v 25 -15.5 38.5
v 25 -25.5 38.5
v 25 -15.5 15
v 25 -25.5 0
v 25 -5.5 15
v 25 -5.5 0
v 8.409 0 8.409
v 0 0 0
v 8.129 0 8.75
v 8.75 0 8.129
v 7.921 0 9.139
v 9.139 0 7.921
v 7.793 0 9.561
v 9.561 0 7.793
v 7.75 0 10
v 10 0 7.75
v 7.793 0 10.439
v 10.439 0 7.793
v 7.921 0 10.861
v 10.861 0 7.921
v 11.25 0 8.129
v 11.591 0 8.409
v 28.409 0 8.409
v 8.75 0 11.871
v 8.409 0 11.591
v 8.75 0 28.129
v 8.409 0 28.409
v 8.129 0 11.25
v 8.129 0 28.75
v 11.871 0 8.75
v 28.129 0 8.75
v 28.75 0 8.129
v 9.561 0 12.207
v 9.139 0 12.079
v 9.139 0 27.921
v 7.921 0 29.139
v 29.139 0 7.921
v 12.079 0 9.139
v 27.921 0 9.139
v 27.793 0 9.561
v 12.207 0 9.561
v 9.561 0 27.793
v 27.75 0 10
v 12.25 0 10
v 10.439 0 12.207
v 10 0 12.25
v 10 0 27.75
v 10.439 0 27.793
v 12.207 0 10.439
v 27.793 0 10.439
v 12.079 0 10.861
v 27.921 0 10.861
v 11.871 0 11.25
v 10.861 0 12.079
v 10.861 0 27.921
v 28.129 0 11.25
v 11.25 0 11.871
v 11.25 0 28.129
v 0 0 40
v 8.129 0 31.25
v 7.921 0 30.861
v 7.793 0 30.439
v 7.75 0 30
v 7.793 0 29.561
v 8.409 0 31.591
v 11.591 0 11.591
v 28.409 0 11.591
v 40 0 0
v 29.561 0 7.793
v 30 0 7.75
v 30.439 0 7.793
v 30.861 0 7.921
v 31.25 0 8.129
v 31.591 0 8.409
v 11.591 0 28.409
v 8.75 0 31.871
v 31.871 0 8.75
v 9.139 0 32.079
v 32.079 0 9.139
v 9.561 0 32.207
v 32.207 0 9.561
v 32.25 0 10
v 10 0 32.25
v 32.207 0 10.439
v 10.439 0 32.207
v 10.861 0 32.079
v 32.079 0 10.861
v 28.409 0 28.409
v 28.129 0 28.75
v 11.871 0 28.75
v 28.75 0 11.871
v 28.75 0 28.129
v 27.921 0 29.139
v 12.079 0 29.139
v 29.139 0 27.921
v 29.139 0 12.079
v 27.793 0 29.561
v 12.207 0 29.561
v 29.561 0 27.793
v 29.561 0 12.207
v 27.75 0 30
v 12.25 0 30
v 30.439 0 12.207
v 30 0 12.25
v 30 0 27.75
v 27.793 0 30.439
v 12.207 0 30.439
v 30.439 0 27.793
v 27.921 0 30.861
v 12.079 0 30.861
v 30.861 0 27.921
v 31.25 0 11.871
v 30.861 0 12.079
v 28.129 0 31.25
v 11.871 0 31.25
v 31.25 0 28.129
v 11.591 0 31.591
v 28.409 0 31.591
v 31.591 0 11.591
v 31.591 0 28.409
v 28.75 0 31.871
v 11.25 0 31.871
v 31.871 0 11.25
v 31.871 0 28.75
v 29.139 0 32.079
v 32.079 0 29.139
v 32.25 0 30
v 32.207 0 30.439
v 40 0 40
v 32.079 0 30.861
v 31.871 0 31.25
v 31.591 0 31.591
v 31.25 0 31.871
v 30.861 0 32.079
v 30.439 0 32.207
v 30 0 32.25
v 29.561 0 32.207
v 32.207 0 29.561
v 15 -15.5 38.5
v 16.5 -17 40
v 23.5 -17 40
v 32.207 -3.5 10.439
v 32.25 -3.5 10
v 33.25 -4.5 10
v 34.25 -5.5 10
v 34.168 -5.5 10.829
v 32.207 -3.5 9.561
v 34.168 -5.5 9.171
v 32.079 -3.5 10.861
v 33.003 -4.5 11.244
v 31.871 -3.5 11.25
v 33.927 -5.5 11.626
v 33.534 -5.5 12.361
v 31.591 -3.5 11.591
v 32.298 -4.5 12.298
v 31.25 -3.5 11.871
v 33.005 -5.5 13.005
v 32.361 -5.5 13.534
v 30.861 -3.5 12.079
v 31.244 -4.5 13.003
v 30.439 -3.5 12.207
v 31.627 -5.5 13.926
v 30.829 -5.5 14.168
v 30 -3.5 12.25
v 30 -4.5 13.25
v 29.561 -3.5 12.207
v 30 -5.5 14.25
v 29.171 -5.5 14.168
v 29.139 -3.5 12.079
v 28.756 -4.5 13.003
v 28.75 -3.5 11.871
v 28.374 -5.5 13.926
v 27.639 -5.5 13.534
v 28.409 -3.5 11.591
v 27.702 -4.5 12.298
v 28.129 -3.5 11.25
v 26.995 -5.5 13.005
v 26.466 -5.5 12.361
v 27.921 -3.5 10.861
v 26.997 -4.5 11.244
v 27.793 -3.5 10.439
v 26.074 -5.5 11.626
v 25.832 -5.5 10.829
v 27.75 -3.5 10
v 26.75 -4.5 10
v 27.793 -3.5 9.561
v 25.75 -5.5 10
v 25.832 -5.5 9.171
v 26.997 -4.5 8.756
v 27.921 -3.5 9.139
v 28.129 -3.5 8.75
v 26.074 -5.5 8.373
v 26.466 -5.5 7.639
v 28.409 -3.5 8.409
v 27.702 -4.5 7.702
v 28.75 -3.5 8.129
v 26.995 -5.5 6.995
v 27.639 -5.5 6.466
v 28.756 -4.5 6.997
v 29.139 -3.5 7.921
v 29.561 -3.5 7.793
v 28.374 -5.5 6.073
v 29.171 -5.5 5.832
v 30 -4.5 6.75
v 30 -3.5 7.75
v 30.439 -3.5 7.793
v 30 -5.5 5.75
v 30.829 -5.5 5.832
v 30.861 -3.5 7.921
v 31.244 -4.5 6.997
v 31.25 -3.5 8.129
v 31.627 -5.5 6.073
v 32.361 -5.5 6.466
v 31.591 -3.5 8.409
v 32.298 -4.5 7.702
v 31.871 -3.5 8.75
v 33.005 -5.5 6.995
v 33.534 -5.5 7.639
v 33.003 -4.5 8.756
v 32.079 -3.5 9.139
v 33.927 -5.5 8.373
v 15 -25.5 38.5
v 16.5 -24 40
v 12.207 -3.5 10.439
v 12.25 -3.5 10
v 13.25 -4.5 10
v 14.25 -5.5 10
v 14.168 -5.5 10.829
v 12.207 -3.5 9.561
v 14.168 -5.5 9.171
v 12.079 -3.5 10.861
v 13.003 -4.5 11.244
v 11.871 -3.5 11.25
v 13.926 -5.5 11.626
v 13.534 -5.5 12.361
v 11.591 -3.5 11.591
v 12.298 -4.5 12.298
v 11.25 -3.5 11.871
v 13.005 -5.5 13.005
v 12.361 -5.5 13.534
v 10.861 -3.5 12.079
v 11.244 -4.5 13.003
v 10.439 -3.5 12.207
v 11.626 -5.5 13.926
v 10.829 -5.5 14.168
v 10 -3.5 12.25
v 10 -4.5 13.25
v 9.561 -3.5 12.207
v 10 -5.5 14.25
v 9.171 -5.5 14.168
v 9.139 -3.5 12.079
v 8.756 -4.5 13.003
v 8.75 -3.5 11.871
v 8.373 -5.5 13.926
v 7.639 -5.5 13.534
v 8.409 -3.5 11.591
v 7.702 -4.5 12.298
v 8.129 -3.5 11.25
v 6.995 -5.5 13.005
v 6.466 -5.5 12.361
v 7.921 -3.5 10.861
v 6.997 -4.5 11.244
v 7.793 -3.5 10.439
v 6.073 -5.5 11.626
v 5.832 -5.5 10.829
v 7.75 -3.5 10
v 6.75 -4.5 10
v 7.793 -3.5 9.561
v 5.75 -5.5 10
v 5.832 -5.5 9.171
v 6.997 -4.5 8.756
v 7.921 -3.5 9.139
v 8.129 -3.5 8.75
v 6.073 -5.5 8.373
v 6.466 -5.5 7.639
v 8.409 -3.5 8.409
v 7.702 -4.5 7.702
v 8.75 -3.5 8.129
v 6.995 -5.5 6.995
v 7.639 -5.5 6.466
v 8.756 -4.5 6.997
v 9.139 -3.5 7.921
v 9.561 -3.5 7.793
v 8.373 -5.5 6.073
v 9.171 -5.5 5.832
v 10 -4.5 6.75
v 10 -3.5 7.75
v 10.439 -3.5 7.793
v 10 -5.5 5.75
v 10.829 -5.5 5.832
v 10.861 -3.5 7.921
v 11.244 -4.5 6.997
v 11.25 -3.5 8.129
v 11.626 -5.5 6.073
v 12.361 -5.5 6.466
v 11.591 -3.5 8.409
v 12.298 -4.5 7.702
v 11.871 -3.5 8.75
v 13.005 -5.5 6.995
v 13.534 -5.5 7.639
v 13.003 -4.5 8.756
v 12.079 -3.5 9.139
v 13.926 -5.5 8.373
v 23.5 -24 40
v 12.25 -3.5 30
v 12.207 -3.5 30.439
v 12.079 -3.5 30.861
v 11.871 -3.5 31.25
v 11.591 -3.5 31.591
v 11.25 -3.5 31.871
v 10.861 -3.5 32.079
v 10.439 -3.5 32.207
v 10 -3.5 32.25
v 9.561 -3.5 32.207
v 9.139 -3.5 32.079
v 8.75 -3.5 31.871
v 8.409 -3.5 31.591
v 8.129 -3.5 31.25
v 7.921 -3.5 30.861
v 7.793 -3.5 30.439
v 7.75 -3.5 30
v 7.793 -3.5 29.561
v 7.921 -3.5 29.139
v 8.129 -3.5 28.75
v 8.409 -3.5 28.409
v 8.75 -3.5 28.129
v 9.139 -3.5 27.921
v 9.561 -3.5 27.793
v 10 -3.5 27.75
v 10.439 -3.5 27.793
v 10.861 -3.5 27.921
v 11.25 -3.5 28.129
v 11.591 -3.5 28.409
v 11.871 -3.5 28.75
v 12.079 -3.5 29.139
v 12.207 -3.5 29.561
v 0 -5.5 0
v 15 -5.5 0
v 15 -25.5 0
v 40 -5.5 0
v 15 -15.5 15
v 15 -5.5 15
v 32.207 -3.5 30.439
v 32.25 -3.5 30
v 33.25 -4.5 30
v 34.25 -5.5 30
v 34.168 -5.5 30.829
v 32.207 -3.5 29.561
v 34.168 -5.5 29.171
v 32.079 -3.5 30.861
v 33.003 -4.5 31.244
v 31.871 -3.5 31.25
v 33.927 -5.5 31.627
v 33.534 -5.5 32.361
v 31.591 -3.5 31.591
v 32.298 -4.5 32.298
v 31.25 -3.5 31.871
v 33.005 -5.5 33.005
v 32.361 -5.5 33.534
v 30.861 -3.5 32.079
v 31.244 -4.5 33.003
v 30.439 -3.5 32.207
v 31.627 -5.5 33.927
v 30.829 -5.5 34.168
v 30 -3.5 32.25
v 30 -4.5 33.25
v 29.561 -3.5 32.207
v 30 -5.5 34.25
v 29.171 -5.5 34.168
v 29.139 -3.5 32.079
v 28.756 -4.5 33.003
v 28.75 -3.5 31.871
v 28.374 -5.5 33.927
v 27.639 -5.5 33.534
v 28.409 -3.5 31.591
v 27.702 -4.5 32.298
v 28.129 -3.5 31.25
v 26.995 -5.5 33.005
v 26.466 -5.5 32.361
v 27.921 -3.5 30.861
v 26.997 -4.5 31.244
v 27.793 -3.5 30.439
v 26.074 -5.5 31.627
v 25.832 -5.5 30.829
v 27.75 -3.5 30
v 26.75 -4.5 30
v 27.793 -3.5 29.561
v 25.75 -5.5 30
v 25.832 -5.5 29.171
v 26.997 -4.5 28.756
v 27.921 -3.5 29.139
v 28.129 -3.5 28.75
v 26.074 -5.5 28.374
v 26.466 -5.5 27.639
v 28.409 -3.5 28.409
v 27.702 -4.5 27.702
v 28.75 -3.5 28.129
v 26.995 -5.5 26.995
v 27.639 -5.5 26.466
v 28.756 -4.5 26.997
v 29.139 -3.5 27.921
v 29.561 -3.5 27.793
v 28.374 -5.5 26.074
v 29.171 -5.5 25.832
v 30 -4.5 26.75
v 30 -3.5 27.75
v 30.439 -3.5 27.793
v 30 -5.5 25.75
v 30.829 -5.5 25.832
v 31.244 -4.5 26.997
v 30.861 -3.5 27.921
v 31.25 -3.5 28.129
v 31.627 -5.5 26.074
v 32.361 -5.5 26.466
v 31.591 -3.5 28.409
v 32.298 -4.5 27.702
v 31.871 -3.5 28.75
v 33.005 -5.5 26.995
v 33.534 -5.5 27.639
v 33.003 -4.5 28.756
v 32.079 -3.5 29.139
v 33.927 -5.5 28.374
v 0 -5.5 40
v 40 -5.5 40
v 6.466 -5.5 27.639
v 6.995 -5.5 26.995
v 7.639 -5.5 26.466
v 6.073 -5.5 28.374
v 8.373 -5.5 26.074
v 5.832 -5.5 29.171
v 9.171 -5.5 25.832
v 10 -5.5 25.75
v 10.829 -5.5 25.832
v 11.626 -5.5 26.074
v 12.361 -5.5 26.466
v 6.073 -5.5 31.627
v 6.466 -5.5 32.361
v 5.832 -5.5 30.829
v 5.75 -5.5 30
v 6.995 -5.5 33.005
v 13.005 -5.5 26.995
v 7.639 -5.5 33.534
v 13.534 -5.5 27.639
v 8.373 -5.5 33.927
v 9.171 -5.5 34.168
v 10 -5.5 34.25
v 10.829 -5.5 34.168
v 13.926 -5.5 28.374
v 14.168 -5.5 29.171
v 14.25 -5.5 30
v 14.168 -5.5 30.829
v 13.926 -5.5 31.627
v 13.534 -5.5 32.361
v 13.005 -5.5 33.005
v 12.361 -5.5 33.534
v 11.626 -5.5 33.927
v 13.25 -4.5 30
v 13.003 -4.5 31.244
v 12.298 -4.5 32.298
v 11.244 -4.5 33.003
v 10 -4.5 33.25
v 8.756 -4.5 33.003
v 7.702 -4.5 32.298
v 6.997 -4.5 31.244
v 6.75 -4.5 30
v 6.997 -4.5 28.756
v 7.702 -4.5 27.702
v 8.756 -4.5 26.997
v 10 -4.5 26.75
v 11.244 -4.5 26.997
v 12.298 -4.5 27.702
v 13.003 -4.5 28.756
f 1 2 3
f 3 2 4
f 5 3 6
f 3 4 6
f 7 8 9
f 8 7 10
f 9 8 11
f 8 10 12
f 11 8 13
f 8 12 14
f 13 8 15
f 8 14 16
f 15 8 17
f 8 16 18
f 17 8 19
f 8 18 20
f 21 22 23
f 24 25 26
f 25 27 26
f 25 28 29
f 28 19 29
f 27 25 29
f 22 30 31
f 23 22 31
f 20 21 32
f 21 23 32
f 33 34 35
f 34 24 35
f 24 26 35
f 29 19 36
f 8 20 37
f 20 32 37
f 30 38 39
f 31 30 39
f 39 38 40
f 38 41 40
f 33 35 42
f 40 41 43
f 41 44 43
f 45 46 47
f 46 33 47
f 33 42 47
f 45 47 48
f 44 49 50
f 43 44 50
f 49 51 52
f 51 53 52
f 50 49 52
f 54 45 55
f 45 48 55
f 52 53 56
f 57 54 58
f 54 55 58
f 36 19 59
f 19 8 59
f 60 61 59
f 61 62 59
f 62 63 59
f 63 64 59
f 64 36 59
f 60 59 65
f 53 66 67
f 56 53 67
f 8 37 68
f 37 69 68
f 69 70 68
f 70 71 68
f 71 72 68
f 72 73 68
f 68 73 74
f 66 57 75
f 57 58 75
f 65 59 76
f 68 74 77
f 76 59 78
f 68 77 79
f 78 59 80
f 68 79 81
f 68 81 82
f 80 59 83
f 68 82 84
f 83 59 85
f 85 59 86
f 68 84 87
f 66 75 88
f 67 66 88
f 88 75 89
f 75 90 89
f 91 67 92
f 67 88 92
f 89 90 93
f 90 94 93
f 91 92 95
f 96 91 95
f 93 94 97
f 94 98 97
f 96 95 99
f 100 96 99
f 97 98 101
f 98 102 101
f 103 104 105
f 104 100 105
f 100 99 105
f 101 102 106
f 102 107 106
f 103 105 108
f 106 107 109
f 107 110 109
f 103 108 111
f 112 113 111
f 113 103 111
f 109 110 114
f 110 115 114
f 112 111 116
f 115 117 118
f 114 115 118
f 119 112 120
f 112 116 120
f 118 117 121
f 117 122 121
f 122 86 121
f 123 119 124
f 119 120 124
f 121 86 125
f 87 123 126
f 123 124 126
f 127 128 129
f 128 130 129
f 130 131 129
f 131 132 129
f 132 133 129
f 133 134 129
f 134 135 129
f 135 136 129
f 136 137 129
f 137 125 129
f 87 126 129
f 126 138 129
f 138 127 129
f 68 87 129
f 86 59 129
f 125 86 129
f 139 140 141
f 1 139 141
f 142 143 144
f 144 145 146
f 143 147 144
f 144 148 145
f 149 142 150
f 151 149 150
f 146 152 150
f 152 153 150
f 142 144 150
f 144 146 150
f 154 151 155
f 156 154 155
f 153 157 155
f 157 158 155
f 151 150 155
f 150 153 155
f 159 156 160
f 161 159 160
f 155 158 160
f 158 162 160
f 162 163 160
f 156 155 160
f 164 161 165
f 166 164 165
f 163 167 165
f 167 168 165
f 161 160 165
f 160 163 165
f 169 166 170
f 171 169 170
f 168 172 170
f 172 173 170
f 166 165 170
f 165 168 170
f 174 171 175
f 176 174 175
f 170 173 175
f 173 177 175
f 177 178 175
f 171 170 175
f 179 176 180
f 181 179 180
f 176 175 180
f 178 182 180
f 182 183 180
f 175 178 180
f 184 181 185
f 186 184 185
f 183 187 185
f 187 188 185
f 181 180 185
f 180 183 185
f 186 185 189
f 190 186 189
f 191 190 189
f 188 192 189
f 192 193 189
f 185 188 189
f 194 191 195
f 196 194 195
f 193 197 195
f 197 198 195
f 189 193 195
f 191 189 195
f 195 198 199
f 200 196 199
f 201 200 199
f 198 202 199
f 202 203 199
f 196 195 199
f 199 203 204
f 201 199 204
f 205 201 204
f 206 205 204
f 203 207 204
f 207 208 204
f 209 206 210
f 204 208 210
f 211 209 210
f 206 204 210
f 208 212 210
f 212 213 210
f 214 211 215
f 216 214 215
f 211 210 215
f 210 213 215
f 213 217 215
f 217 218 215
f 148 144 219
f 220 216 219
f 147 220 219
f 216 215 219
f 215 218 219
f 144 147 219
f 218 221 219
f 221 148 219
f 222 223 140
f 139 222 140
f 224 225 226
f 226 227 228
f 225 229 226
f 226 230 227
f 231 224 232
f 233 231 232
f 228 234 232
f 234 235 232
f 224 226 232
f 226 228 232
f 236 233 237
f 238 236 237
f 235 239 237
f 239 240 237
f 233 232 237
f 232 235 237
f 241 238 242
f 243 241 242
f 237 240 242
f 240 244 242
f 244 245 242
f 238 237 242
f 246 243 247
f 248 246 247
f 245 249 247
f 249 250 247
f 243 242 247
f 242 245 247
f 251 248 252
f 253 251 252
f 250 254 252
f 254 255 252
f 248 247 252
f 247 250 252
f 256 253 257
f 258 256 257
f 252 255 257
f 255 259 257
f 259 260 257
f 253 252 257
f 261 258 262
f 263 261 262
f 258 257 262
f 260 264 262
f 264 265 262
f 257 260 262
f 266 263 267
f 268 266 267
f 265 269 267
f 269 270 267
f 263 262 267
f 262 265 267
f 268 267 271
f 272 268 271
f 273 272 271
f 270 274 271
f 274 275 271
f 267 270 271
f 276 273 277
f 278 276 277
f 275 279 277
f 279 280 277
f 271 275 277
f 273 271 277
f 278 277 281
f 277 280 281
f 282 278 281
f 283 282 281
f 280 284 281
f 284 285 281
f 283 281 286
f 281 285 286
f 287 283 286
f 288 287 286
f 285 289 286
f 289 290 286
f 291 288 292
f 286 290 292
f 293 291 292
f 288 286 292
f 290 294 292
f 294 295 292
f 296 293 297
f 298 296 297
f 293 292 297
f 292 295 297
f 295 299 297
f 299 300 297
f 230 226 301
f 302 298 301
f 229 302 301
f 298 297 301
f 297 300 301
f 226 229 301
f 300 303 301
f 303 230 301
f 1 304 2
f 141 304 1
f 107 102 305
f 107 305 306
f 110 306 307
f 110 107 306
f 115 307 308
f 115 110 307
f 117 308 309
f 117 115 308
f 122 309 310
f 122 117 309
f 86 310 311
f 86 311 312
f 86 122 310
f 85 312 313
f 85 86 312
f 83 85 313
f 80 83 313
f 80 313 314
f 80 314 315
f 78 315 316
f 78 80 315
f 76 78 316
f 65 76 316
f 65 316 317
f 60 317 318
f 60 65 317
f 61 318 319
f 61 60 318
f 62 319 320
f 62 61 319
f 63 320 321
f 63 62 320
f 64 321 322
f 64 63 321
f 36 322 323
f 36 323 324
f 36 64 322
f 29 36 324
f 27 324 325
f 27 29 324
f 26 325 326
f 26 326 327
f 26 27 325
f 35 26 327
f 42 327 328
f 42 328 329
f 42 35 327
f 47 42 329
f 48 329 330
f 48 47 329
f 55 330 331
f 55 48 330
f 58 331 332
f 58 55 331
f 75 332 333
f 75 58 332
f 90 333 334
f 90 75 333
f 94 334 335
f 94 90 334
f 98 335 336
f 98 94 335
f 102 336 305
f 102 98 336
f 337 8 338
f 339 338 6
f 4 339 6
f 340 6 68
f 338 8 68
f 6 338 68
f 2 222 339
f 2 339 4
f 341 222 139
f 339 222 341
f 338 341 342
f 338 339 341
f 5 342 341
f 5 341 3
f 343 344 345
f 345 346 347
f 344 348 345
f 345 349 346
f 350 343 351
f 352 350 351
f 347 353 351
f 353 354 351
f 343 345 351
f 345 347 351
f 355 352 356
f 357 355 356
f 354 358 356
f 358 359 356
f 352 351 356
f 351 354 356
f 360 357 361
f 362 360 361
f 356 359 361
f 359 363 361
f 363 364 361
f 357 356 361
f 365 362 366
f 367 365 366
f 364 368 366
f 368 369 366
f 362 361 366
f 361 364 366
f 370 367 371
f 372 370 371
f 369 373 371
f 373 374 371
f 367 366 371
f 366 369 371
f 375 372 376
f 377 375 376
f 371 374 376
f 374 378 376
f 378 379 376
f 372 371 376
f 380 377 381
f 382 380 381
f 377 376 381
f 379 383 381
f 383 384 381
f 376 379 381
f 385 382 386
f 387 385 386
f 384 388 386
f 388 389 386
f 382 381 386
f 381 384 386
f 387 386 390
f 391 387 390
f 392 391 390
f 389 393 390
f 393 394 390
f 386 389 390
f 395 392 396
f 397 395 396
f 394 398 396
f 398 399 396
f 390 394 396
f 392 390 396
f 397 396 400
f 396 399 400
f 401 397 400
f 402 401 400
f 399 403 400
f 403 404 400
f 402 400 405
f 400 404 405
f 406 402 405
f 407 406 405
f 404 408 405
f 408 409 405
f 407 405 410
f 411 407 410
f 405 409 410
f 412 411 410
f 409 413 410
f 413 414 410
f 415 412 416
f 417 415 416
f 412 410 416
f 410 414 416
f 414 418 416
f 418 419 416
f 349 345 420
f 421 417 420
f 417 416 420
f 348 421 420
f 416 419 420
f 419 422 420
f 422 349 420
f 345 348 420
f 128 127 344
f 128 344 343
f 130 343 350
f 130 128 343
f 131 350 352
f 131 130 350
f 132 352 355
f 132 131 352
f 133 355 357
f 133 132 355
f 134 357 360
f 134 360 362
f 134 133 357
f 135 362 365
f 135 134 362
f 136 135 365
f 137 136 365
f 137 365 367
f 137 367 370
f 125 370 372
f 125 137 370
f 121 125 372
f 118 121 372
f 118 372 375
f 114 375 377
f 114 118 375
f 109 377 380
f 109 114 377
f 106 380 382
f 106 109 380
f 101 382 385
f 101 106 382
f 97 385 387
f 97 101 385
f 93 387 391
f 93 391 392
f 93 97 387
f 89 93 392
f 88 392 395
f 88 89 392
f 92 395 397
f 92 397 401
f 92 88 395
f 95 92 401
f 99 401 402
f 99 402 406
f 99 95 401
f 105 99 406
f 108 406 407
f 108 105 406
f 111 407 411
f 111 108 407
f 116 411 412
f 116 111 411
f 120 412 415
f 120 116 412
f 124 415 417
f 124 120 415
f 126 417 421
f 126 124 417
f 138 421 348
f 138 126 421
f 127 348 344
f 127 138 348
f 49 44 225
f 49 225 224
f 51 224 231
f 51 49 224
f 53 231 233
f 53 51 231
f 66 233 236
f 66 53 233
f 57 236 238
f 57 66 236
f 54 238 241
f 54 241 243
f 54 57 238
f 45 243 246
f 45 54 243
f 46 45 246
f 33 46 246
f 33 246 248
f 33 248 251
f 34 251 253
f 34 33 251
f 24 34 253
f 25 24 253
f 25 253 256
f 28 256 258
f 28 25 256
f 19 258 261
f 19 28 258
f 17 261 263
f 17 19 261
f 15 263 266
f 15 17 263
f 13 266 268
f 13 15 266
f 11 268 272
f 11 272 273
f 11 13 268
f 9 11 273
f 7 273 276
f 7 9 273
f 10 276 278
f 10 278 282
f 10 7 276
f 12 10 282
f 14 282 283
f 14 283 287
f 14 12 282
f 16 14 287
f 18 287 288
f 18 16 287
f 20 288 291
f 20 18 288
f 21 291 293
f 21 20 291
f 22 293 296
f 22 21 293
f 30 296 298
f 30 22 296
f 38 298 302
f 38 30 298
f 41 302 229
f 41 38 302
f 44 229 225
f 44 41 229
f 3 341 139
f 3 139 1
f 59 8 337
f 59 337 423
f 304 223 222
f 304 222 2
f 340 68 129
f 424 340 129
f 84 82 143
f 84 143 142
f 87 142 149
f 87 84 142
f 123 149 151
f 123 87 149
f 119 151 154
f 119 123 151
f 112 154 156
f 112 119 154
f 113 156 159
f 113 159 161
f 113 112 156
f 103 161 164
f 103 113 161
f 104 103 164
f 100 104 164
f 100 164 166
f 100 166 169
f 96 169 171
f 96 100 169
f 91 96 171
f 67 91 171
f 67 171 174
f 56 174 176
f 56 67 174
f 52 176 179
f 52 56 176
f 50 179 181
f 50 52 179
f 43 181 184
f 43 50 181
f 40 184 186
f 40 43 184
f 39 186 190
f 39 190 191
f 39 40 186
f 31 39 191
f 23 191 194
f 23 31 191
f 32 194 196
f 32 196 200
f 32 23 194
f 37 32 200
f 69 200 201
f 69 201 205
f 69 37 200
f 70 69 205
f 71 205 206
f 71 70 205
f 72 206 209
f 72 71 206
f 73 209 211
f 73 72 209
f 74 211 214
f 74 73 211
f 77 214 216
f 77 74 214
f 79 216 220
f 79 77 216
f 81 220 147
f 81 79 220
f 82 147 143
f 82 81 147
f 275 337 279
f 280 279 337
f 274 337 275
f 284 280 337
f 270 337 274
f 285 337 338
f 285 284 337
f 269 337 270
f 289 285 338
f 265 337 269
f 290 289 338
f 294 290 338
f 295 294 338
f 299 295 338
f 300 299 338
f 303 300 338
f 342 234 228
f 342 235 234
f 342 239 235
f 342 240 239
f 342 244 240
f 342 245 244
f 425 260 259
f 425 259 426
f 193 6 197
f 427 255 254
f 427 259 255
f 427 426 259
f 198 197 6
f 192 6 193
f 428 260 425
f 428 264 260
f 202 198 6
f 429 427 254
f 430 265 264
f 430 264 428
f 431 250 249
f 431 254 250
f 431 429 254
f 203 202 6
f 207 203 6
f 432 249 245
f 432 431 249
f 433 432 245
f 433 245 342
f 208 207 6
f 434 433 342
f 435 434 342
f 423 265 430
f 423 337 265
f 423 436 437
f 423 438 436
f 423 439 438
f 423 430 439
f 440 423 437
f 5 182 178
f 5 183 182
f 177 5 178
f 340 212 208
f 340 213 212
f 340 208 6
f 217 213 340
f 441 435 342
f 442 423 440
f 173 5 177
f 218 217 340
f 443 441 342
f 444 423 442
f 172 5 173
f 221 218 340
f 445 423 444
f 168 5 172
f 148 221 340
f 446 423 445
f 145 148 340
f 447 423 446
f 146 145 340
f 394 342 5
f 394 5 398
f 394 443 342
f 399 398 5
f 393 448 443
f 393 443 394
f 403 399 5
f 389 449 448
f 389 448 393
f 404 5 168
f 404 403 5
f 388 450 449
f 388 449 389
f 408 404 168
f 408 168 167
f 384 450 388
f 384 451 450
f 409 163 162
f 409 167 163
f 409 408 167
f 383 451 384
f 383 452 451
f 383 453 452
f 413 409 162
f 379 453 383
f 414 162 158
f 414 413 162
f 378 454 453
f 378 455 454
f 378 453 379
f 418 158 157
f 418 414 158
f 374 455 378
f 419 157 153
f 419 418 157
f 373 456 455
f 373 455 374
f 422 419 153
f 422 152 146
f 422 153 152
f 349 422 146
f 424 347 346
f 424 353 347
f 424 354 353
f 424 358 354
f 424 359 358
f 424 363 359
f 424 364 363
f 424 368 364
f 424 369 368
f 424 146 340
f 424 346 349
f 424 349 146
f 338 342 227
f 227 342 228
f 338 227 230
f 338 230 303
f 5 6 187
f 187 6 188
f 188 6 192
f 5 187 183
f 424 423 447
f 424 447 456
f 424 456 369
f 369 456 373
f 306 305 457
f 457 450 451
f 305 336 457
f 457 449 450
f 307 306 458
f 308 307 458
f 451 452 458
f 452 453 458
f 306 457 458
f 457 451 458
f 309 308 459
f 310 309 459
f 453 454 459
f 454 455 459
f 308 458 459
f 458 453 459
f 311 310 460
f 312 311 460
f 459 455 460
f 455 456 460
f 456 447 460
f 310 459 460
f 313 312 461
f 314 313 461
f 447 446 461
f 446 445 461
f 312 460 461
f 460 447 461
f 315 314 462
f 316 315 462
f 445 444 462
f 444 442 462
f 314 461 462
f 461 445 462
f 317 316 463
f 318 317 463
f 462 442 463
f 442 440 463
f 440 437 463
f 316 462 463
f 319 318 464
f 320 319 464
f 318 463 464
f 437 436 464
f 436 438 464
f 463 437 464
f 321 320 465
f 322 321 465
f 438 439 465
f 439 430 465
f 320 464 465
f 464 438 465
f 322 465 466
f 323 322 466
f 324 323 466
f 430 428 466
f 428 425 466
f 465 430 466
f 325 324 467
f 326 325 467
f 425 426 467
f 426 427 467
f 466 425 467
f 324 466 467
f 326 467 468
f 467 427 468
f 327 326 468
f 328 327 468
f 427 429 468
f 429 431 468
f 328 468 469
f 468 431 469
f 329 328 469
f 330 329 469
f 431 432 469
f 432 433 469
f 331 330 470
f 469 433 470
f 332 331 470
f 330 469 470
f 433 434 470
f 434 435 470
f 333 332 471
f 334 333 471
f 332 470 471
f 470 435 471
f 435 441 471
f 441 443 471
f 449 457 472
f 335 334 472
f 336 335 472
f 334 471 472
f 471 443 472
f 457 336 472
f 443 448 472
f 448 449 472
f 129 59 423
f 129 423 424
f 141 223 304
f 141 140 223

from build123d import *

# Parameters (mm, degrees)
F0_W     = 40
F0_H     = 40
F0_R     = 2.25
F1_DEPTH = 5.5
F2_SIZE  = 2
F3_W     = 10
F3_H     = 15
F4_DEPTH = 20
F5_W     = 10
F5_H     = 10
F6_DEPTH = 25
F7_SIZE  = 1.5


with BuildPart() as f1:
    # F0 (on Front) → F1 (new body)
    with BuildSketch(Plane.XZ):
        with Locations((20, 20)):
            Rectangle(F0_W, F0_H)
        with Locations((9.999904, 9.999904)):
            Circle(F0_R, mode=Mode.SUBTRACT)
        with Locations((30.000096, 9.999904)):
            Circle(F0_R, mode=Mode.SUBTRACT)
        with Locations((9.999904, 30.000096)):
            Circle(F0_R, mode=Mode.SUBTRACT)
        with Locations((30.000096, 30.000096)):
            Circle(F0_R, mode=Mode.SUBTRACT)
    extrude(amount=F1_DEPTH)

    # F2
    f2_edges = [f1.edges().sort_by_distance(p)[0] for p in [
        (7.749904, -5.5, 30.000096),
        (27.750096, -5.5, 30.000096),
        (27.750096, -5.5, 9.999904),
        (7.749904, -5.5, 9.999904),
    ]]
    chamfer(f2_edges, length=F2_SIZE)

    # F3 (on face) → F4 (join)
    with BuildSketch(Plane.XZ.offset(5.5)):
        with Locations((20, 7.5)):
            Rectangle(F3_W, F3_H)
    extrude(amount=F4_DEPTH)

    # F5 (on face) → F6 (join)
    with BuildSketch(Plane.XY.offset(15)):
        with Locations((20, -20.5)):
            Rectangle(F5_W, F5_H)
    extrude(amount=F6_DEPTH)

    # F7
    f7_edges = [f1.edges().sort_by_distance(p)[0] for p in [
        (20, -25.5, 40),
        (25, -20.5, 40),
        (20, -15.5, 40),
        (15, -20.5, 40),
    ]]
    chamfer(f7_edges, length=F7_SIZE)


solid = f1.part
